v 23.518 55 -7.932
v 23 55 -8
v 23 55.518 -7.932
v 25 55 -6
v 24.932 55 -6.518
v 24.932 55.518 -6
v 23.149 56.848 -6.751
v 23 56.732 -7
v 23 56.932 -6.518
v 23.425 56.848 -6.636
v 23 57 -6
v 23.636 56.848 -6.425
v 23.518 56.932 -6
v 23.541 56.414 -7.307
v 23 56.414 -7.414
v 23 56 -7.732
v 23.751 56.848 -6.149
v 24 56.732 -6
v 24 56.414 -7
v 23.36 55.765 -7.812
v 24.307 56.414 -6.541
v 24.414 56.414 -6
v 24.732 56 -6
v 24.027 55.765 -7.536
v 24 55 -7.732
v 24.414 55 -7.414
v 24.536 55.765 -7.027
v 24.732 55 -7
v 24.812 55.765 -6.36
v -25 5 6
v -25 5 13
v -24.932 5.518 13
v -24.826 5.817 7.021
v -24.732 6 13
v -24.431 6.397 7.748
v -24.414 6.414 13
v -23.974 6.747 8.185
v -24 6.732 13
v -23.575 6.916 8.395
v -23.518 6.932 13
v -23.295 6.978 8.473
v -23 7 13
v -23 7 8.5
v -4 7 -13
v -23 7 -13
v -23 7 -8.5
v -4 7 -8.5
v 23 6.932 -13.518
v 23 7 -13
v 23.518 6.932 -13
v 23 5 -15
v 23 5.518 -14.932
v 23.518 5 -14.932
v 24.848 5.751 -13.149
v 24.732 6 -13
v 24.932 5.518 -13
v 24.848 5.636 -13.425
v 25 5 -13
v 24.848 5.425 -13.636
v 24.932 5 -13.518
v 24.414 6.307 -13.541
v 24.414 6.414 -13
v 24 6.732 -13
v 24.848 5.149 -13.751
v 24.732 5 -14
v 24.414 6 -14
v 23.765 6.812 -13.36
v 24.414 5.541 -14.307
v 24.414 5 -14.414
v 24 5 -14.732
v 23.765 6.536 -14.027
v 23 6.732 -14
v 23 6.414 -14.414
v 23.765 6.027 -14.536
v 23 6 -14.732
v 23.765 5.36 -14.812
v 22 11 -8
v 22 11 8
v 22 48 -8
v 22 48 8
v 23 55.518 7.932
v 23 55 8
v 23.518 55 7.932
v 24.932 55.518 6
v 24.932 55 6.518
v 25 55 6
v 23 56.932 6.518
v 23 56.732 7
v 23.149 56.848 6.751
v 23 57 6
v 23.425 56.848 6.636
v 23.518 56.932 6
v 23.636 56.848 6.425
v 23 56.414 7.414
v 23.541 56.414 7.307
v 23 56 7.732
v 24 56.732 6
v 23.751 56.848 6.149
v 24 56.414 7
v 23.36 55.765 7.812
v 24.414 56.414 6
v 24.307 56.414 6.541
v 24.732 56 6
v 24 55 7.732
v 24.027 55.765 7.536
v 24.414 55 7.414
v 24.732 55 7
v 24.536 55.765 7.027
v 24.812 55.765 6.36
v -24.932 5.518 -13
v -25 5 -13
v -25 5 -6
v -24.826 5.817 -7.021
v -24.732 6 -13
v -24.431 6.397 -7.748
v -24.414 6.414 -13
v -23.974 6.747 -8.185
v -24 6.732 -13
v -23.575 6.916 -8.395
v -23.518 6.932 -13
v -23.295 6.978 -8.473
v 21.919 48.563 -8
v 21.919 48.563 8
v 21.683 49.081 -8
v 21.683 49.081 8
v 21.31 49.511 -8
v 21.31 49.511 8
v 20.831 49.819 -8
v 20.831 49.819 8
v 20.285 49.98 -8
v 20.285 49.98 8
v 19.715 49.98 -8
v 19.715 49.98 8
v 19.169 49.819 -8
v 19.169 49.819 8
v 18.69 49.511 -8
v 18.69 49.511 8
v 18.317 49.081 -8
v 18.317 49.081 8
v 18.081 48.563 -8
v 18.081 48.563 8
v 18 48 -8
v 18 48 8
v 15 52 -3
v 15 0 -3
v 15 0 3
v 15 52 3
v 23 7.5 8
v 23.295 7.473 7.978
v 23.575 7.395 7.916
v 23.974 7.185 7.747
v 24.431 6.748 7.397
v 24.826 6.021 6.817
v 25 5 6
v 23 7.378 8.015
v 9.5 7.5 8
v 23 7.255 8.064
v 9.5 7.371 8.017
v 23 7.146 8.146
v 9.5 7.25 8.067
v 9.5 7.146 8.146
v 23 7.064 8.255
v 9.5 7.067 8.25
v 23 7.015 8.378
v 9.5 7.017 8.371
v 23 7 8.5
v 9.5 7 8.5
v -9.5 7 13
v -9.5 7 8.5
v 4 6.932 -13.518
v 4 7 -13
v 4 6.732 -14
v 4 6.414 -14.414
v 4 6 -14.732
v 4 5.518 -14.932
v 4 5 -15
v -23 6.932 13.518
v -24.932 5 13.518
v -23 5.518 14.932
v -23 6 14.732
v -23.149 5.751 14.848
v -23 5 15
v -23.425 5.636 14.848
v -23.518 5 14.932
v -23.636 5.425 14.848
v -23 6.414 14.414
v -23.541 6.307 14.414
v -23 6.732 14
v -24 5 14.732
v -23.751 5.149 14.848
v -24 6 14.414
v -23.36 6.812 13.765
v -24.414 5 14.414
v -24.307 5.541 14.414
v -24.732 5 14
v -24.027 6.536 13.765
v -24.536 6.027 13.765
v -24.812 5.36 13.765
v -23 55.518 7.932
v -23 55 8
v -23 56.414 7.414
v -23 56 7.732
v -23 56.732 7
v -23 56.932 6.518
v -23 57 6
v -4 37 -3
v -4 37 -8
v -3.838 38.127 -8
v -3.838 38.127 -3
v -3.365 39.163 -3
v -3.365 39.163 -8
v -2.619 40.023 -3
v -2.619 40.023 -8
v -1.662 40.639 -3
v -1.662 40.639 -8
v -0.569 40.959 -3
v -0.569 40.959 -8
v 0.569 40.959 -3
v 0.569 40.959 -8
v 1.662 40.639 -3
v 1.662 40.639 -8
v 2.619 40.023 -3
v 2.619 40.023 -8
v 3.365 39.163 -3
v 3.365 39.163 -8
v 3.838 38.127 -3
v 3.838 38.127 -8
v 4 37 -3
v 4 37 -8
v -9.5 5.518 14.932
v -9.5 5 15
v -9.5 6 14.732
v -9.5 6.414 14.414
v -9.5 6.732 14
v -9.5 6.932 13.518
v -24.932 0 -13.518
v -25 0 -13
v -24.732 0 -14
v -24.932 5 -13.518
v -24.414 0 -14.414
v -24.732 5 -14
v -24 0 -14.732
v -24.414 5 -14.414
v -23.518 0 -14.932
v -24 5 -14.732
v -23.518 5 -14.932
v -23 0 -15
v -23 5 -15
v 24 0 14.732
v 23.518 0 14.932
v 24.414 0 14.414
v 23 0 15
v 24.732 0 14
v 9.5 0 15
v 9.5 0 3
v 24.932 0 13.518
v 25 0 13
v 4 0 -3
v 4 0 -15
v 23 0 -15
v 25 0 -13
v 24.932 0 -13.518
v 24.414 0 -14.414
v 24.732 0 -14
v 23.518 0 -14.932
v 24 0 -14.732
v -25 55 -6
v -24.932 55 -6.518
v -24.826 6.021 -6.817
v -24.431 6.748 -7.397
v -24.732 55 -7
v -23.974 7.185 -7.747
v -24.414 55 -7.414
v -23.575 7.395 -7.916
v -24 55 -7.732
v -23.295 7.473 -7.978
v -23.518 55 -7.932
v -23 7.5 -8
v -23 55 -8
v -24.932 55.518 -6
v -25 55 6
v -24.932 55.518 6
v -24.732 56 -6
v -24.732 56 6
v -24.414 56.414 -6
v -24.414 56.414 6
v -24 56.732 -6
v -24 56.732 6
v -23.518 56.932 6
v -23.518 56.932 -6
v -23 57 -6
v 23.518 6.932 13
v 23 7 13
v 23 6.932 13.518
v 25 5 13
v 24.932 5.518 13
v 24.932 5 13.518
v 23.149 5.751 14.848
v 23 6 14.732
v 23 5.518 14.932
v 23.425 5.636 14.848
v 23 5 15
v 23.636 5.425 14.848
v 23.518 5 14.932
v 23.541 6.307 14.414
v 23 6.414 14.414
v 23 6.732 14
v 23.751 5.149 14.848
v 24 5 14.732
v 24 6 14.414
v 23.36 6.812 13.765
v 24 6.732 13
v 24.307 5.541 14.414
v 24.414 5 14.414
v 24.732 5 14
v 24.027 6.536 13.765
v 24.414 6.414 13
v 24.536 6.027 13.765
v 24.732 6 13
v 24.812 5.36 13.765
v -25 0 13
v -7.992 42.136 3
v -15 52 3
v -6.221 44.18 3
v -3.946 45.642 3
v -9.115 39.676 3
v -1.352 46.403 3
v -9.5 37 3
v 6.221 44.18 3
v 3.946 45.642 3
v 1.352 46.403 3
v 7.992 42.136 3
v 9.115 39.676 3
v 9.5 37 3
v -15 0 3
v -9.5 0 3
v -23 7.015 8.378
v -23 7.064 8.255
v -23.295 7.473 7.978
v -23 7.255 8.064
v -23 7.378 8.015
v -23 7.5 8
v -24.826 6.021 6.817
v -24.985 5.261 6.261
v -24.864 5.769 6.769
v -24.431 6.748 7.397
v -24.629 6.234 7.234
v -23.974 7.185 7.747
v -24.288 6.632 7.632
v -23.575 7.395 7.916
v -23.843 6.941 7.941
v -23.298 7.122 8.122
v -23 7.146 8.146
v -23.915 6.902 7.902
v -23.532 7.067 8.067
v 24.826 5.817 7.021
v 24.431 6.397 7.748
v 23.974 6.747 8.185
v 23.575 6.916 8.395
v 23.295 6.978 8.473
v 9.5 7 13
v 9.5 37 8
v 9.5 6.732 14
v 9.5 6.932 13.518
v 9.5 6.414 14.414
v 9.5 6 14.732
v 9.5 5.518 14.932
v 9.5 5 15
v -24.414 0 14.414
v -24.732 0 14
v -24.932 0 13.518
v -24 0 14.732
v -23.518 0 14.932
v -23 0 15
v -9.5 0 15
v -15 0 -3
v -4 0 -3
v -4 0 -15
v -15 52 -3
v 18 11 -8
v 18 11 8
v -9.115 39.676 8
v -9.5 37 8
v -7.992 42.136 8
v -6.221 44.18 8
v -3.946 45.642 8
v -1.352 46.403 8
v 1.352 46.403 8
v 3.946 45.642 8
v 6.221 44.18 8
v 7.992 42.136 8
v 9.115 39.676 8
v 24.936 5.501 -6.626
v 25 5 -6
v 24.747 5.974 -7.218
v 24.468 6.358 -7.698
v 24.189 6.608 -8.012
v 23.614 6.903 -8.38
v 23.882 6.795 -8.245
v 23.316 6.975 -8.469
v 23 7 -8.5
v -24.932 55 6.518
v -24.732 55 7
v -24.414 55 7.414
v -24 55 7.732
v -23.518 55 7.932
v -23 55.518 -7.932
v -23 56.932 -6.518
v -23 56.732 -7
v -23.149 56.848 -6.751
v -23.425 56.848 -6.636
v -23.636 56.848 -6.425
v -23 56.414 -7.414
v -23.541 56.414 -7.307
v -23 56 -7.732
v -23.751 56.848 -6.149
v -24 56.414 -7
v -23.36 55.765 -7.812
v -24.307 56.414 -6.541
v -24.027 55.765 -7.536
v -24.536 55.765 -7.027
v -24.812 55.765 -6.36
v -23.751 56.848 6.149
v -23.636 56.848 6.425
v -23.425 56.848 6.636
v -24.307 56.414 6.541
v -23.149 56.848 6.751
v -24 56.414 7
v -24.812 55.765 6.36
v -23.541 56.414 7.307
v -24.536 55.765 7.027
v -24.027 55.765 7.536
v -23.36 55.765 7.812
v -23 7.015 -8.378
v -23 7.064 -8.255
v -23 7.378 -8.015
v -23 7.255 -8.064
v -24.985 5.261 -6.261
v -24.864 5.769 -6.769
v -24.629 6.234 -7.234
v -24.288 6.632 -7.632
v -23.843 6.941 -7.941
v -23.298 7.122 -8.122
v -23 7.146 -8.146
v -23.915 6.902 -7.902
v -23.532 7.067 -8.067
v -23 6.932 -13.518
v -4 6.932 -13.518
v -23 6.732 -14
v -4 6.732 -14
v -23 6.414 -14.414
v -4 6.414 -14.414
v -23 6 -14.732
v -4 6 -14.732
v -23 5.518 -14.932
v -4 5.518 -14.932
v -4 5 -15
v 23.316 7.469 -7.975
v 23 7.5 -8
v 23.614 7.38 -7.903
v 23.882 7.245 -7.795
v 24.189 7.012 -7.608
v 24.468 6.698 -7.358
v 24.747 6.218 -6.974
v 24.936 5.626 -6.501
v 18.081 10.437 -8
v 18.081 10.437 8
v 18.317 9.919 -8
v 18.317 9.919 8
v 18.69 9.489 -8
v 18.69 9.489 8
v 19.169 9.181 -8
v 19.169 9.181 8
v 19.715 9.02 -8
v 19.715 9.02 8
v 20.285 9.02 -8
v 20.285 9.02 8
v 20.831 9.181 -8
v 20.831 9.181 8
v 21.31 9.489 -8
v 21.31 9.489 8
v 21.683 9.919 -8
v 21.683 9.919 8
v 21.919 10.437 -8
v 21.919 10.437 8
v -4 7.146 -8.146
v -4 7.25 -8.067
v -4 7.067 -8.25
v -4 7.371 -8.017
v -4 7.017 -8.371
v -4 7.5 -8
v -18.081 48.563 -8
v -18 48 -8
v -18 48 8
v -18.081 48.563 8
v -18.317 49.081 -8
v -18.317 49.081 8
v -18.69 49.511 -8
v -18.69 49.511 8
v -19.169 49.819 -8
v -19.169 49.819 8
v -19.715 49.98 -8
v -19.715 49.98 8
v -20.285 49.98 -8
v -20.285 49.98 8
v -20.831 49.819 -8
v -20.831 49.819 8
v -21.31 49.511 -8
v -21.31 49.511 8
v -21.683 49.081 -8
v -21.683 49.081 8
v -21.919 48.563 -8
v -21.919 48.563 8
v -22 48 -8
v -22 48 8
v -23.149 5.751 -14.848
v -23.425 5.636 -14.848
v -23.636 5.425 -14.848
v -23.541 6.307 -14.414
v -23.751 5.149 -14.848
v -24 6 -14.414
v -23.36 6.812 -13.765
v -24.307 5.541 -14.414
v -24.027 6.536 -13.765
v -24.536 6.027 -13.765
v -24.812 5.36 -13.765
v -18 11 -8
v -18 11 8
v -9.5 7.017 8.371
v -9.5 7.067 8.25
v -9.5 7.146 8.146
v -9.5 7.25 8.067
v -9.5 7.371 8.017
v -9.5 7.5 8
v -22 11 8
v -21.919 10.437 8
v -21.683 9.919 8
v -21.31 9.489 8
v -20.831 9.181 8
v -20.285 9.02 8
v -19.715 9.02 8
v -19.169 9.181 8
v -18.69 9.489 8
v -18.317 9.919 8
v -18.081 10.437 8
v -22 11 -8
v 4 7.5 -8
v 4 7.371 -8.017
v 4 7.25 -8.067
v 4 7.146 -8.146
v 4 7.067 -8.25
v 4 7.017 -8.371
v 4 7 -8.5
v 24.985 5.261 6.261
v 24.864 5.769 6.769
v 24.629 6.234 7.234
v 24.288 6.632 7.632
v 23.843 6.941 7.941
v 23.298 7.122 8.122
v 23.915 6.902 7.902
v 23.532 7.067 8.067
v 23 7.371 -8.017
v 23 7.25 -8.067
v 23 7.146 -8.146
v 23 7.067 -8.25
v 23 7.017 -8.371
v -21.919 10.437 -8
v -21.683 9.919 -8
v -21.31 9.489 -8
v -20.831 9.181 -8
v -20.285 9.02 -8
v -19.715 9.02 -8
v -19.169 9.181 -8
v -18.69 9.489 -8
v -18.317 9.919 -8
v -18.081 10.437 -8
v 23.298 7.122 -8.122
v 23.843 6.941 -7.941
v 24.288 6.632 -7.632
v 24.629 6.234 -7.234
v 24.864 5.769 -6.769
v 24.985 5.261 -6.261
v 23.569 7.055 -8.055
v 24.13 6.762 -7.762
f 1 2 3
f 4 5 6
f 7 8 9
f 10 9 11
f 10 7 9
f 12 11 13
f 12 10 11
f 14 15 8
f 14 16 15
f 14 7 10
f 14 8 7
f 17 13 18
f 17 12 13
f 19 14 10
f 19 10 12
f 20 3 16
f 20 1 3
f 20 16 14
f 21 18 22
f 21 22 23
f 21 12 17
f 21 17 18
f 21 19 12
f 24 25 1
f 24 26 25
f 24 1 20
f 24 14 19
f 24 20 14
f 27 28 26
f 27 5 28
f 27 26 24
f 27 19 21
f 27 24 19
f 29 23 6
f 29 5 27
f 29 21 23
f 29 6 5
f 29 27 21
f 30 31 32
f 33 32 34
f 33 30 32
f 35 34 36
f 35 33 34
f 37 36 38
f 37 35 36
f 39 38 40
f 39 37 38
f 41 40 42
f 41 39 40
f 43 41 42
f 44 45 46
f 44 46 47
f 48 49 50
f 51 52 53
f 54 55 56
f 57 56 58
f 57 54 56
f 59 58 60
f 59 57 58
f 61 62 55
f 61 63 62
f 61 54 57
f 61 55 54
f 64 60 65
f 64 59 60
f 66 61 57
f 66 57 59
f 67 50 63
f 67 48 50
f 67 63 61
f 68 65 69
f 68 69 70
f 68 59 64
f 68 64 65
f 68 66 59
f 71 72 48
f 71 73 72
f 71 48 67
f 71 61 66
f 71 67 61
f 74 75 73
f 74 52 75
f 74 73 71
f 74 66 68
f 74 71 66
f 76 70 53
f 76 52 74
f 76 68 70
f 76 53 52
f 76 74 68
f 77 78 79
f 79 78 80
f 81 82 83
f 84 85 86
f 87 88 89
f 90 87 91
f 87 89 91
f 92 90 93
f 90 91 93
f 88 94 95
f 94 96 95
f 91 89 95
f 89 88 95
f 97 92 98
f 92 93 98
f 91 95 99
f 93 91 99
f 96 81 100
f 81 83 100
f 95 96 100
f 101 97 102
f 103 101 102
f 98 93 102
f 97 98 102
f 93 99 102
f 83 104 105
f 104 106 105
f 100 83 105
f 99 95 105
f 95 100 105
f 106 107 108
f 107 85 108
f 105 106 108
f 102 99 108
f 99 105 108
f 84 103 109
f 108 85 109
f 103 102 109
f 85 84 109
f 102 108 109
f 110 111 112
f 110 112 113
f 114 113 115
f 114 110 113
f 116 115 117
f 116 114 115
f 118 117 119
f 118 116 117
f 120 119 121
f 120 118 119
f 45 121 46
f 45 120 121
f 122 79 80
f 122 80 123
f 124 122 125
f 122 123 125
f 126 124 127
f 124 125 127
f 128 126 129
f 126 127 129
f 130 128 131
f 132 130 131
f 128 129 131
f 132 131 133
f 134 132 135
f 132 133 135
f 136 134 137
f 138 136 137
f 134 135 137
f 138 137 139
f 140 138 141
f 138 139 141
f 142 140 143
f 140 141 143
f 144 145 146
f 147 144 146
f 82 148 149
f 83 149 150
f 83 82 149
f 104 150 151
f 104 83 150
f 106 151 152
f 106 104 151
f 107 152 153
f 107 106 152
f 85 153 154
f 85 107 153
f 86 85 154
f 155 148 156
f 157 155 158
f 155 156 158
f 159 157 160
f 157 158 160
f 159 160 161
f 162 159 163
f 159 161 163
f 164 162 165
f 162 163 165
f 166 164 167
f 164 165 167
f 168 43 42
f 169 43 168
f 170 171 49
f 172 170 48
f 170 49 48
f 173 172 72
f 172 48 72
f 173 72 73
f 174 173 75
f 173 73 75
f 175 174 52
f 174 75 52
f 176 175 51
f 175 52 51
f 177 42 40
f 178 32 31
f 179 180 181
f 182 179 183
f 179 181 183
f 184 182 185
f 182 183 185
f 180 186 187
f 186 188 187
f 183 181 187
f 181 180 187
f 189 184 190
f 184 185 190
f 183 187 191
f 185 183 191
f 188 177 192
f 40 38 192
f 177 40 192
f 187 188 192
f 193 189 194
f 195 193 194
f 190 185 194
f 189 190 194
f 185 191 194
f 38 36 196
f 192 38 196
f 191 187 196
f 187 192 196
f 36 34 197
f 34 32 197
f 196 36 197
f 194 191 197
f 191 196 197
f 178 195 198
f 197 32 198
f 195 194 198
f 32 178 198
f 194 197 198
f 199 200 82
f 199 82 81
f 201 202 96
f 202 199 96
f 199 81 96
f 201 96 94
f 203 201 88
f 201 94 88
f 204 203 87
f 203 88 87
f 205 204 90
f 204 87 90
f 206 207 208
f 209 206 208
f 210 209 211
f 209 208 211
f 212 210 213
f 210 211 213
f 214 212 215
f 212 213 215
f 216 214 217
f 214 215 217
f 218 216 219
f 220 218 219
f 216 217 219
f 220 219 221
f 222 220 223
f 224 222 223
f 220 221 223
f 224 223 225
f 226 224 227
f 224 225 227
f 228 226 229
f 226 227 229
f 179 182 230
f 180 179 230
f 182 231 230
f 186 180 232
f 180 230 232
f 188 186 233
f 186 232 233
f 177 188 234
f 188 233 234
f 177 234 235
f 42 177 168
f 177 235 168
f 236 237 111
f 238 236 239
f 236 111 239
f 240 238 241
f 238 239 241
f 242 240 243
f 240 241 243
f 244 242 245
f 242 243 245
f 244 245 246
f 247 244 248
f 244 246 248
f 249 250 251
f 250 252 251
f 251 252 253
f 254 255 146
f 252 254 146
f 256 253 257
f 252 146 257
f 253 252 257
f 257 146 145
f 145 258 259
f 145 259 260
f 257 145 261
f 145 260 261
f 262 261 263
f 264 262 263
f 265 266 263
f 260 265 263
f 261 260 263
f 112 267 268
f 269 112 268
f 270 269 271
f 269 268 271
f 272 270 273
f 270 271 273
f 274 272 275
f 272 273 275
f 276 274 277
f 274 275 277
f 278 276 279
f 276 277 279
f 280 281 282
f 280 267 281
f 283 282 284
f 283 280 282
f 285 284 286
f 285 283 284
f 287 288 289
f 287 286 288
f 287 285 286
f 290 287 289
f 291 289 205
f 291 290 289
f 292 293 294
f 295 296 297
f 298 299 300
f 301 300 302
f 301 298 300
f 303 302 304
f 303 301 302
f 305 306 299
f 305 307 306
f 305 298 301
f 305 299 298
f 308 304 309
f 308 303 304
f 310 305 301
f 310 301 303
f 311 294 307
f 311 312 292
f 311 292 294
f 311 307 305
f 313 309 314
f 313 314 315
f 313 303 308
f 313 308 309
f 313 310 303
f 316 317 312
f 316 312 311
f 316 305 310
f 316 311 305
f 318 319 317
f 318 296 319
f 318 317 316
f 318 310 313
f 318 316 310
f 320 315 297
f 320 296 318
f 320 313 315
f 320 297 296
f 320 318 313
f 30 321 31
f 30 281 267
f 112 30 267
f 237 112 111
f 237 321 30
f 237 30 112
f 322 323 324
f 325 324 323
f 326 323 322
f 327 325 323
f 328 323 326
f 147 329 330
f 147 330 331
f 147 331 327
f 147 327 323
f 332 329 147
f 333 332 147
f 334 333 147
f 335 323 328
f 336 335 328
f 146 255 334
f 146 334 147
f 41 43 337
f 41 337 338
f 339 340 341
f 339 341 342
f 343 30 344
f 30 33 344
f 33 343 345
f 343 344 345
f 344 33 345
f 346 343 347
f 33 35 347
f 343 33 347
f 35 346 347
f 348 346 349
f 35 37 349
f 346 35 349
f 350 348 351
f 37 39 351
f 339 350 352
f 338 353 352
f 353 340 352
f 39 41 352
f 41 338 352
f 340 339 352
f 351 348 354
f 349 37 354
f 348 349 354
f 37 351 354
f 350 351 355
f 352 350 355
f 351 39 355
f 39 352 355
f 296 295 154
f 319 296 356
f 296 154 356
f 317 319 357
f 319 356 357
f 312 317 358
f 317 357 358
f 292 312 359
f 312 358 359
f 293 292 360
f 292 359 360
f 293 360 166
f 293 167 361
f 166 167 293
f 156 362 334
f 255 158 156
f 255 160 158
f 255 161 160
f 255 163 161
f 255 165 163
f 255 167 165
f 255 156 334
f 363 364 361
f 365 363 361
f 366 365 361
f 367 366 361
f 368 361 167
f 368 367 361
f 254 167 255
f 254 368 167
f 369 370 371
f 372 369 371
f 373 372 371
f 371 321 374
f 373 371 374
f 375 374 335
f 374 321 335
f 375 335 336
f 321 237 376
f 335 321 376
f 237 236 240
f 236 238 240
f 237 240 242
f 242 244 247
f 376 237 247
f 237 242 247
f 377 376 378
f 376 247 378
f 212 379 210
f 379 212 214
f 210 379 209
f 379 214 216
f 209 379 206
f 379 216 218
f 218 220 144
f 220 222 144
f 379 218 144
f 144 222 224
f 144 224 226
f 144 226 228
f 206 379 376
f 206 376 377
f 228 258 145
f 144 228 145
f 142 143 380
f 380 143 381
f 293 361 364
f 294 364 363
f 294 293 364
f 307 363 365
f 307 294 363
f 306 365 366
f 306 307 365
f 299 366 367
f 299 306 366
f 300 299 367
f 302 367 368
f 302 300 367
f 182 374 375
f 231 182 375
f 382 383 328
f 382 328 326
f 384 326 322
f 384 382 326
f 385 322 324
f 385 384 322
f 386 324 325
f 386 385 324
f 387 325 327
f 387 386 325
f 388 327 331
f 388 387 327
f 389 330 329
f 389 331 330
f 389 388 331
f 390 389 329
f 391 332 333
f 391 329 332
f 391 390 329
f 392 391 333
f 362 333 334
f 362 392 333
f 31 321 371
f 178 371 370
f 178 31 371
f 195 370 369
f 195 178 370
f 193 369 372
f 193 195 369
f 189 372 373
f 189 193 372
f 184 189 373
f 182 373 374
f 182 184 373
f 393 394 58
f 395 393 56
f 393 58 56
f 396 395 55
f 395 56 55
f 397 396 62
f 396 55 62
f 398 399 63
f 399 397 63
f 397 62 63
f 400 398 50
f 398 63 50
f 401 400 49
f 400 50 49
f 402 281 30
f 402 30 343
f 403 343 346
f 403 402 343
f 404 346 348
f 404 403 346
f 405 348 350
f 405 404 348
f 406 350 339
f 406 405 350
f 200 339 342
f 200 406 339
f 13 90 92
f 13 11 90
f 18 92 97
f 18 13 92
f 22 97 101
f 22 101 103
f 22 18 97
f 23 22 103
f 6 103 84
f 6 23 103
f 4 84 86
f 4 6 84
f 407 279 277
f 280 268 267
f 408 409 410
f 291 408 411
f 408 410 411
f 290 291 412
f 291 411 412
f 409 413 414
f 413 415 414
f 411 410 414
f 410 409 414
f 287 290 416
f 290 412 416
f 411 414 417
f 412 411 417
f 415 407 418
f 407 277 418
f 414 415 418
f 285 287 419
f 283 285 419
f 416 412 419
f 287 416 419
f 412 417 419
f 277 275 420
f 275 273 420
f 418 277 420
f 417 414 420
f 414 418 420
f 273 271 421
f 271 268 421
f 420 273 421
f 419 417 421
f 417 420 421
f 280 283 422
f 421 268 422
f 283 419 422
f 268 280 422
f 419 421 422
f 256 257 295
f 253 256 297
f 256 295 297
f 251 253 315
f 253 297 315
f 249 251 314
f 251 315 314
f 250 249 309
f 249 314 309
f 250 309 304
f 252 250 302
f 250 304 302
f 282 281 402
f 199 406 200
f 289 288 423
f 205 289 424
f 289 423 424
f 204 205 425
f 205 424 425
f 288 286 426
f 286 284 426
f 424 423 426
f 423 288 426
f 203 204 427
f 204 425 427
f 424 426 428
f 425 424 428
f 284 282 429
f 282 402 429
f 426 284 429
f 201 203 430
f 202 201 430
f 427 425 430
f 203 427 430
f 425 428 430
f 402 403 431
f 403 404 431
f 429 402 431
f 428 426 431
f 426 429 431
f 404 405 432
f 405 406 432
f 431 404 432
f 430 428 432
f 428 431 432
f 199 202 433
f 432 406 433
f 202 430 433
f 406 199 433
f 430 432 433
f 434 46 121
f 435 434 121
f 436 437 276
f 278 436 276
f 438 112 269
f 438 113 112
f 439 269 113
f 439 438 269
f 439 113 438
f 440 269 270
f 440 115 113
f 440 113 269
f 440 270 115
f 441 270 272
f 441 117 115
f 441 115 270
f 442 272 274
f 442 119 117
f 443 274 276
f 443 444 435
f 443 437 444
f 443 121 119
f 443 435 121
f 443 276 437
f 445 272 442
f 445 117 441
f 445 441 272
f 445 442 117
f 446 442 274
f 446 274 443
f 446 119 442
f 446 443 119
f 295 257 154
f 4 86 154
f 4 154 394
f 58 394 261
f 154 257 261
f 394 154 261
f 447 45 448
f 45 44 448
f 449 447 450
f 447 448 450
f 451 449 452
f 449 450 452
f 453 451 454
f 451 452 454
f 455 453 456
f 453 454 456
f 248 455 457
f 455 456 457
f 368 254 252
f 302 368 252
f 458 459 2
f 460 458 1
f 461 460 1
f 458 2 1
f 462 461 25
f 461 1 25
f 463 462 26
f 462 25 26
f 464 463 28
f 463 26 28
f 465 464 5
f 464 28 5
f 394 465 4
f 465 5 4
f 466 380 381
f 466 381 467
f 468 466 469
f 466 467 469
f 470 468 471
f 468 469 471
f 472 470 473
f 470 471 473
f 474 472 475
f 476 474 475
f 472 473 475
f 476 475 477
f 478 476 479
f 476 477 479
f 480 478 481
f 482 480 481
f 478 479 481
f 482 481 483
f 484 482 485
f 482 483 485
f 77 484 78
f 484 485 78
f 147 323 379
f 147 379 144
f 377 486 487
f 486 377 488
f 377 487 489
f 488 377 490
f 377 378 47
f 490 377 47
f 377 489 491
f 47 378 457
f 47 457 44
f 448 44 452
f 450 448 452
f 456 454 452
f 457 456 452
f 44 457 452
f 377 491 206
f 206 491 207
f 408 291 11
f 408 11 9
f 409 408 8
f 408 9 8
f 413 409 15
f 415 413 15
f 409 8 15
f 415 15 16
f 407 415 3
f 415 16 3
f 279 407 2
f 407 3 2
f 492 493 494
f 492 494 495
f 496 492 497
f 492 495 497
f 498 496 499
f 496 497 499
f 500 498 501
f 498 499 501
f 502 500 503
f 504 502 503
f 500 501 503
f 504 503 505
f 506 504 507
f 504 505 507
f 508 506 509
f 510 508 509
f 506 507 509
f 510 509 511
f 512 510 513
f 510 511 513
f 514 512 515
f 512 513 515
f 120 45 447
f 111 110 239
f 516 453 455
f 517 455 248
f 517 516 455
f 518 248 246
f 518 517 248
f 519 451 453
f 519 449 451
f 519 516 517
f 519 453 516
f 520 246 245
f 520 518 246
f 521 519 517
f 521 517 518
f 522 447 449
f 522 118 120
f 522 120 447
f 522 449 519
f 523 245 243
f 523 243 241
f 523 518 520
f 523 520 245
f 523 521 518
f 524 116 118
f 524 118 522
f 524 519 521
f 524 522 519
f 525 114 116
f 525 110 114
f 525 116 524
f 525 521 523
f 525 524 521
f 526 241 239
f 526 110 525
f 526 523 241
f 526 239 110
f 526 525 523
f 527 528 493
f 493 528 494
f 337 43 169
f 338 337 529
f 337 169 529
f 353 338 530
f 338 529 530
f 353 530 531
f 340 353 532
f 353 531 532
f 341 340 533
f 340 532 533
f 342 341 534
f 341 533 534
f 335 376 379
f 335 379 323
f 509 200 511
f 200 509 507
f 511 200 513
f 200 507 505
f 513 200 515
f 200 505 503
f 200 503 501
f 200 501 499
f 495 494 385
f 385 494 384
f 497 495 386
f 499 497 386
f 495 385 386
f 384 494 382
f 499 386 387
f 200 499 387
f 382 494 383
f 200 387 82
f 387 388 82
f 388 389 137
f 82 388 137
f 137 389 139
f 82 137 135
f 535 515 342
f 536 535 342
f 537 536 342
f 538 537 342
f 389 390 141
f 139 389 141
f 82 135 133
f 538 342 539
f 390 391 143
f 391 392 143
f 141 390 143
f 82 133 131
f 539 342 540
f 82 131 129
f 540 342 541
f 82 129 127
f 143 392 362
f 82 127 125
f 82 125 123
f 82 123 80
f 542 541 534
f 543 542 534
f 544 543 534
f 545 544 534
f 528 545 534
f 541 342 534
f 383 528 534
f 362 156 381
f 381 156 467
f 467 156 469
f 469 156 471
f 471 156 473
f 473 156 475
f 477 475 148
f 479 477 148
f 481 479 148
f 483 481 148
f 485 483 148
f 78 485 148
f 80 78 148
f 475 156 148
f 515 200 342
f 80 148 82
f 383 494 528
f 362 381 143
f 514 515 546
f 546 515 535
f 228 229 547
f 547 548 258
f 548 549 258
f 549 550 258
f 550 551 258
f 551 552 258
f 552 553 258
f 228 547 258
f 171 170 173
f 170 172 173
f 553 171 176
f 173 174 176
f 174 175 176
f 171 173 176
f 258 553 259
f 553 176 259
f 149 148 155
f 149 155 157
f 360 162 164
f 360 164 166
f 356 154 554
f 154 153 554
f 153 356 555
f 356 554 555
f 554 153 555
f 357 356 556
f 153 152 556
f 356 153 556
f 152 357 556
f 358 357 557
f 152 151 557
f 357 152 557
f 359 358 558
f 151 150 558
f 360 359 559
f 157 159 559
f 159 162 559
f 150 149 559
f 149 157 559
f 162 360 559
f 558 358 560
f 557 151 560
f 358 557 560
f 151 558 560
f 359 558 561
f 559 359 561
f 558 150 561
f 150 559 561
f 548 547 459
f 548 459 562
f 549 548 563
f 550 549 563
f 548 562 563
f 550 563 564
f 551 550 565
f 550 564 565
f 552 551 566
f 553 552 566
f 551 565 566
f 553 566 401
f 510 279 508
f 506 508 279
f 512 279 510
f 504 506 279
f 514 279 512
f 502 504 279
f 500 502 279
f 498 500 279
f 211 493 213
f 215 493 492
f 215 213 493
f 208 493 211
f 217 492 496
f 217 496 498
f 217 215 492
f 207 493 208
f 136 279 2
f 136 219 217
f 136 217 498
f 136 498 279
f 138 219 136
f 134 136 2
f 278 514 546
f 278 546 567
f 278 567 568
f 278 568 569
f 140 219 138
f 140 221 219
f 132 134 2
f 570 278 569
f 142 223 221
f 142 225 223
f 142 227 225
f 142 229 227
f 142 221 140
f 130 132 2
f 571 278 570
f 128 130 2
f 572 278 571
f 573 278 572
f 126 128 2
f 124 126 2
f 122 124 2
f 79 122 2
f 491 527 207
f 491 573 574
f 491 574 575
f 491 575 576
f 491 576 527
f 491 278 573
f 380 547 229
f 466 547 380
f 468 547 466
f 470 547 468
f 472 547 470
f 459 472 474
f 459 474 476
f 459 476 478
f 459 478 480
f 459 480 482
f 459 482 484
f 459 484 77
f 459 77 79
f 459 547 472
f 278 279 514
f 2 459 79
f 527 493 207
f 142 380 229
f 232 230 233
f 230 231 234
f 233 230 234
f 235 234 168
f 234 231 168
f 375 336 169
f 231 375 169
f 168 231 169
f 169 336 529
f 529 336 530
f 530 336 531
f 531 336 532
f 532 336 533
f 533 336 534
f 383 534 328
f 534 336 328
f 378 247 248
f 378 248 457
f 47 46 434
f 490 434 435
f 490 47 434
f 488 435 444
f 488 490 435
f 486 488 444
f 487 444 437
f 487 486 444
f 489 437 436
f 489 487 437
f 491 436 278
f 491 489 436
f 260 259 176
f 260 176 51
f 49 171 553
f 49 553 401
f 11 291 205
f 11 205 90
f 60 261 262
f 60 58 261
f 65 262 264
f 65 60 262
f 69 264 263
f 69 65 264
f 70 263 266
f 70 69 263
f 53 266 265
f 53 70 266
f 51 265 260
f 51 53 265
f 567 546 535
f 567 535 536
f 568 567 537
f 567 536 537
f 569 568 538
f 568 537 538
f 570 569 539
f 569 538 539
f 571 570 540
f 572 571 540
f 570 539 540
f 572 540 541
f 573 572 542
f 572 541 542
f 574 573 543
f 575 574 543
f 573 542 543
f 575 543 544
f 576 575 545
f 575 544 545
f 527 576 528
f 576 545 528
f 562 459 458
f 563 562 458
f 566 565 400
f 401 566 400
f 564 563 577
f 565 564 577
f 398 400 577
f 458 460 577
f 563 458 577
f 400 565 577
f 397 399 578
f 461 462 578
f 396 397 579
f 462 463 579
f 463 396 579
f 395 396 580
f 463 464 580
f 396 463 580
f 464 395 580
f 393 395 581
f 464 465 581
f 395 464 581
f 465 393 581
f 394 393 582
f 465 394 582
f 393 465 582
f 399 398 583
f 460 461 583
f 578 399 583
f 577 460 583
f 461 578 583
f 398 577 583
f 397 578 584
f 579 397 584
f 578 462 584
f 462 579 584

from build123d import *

# Parameters (mm, degrees)
SKETCH2_W                      = 50
SKETCH2_H                      = 30
BOSS_EXTRUDE1_DEPTH            = 7
SKETCH3_W                      = 50
SKETCH3_H                      = 16
BOSS_EXTRUDE2_DEPTH            = 50
SKETCH5_W                      = 30
SKETCH5_H                      = 6
CUT_EXTRUDE1_DEPTH             = 52
CUT_EXTRUDE3_REACH             = 68.355
CUT_EXTRUDE3_DIRECTION_2_REACH = 68.355
CUT_EXTRUDE4_REACH             = 68.355
CUT_EXTRUDE4_DIRECTION_2_REACH = 68.355
CUT_EXTRUDE5_REACH             = 68.355
FILLET1_R                      = 2
FILLET2_R                      = 0.5


with BuildPart() as part:
    # Sketch2 → Boss-Extrude1 (new body)
    with BuildSketch(Plane(origin=(0, 0, 0), x_dir=(1, 0, 0), z_dir=(0, 1, 0))):
        Rectangle(SKETCH2_W, SKETCH2_H)
    extrude(amount=BOSS_EXTRUDE1_DEPTH)

    # Sketch3 → Boss-Extrude2 (add)
    with BuildSketch(Plane(origin=(0, 7, 0), x_dir=(1, 0, 0), z_dir=(0, 1, 0))):
        Rectangle(SKETCH3_W, SKETCH3_H)
    extrude(amount=BOSS_EXTRUDE2_DEPTH)

    # Sketch5 → Cut-Extrude1 (cut)
    with BuildSketch(Plane.XZ):
        Rectangle(SKETCH5_W, SKETCH5_H)
    extrude(amount=-CUT_EXTRUDE1_DEPTH, mode=Mode.SUBTRACT)

    # Sketch4 → Cut-Extrude3 (cut, up to next)
    with BuildSketch(Plane.XY.offset(8), mode=Mode.PRIVATE) as cut_extrude3_sk1:
        with BuildLine():
            Line((-9.5, 15), (-9.5, 37))
            ThreePointArc((-9.5, 37), (0, 46.5), (9.5, 37))
            Line((9.5, 37), (9.5, 15))
            Line((9.5, 15), (9.5, 0))
            Line((9.5, 0), (-9.5, 0))
            Line((-9.5, 0), (-9.5, 15))
        make_face()
    cut_extrude3_tool1 = extrude(cut_extrude3_sk1.sketch, amount=-CUT_EXTRUDE3_REACH, mode=Mode.PRIVATE) & part.part
    add(cut_extrude3_tool1.solids().sort_by_distance((0, 22.281201, 8))[0], mode=Mode.SUBTRACT)

    # Sketch4 → Cut-Extrude3 direction 2 (cut, up to next)
    with BuildSketch(Plane.XY.offset(8), mode=Mode.PRIVATE) as cut_extrude3_direction_2_sk1:
        with BuildLine():
            Line((-9.5, 15), (-9.5, 37))
            ThreePointArc((-9.5, 37), (0, 46.5), (9.5, 37))
            Line((9.5, 37), (9.5, 15))
            Line((9.5, 15), (9.5, 0))
            Line((9.5, 0), (-9.5, 0))
            Line((-9.5, 0), (-9.5, 15))
        make_face()
    cut_extrude3_direction_2_tool1 = extrude(cut_extrude3_direction_2_sk1.sketch, amount=CUT_EXTRUDE3_DIRECTION_2_REACH, mode=Mode.PRIVATE) & part.part
    add(cut_extrude3_direction_2_tool1.solids().sort_by_distance((0, 22.281201, 8))[0], mode=Mode.SUBTRACT)

    # Sketch6 → Cut-Extrude4 (cut, up to next)
    with BuildSketch(Plane(origin=(0, 0, -8), x_dir=(-1, 0, 0), z_dir=(0, 0, -1)), mode=Mode.PRIVATE) as cut_extrude4_sk1:
        with BuildLine():
            Line((-4, 37), (-4, 0))
            Line((-4, 0), (4, 0))
            Line((4, 0), (4, 37))
            ThreePointArc((4, 37), (0, 41), (-4, 37))
        make_face()
    cut_extrude4_tool1 = extrude(cut_extrude4_sk1.sketch, amount=-CUT_EXTRUDE4_REACH, mode=Mode.PRIVATE) & part.part
    add(cut_extrude4_tool1.solids().sort_by_distance((0, 20.080724, -8))[0], mode=Mode.SUBTRACT)

    # Sketch6 → Cut-Extrude4 direction 2 (cut, up to next)
    with BuildSketch(Plane(origin=(0, 0, -8), x_dir=(-1, 0, 0), z_dir=(0, 0, -1)), mode=Mode.PRIVATE) as cut_extrude4_direction_2_sk1:
        with BuildLine():
            Line((-4, 37), (-4, 0))
            Line((-4, 0), (4, 0))
            Line((4, 0), (4, 37))
            ThreePointArc((4, 37), (0, 41), (-4, 37))
        make_face()
    cut_extrude4_direction_2_tool1 = extrude(cut_extrude4_direction_2_sk1.sketch, amount=CUT_EXTRUDE4_DIRECTION_2_REACH, mode=Mode.PRIVATE) & part.part
    add(cut_extrude4_direction_2_tool1.solids().sort_by_distance((0, 20.080724, -8))[0], mode=Mode.SUBTRACT)

    # Sketch8 → Cut-Extrude5 (cut, up to next)
    with BuildSketch(Plane.XY.offset(8), mode=Mode.PRIVATE) as cut_extrude5_sk1:
        with BuildLine():
            Line((-22, 48), (-22, 11))
            ThreePointArc((-22, 11), (-20, 9), (-18, 11))
            Line((-18, 11), (-18, 48))
            ThreePointArc((-18, 48), (-20, 50), (-22, 48))
        make_face()
    cut_extrude5_tool1 = extrude(cut_extrude5_sk1.sketch, amount=-CUT_EXTRUDE5_REACH, mode=Mode.PRIVATE) & part.part
    # Sketch8 → Cut-Extrude5 (cut, up to next)
    with BuildSketch(Plane.XY.offset(8), mode=Mode.PRIVATE) as cut_extrude5_sk2:
        with BuildLine():
            Line((18, 48), (18, 11))
            ThreePointArc((18, 11), (20, 9), (22, 11))
            Line((22, 11), (22, 48))
            ThreePointArc((22, 48), (20, 50), (18, 48))
        make_face()
    cut_extrude5_tool2 = extrude(cut_extrude5_sk2.sketch, amount=-CUT_EXTRUDE5_REACH, mode=Mode.PRIVATE) & part.part
    add(cut_extrude5_tool1.solids().sort_by_distance((-20, 29.5, 8))[0], mode=Mode.SUBTRACT)
    add(cut_extrude5_tool2.solids().sort_by_distance((20, 29.5, 8))[0], mode=Mode.SUBTRACT)

    # Fillet1
    fillet1_edges = [part.edges().sort_by_distance(p)[0] for p in [
        (25, 7, 11.5),
        (14.5, 7, -15),
        (-25, 7, 11.5),
        (25, 7, -11.5),
        (25, 32, -8),
        (-25, 32, -8),
        (-25, 32, 8),
        (25, 32, 8),
        (0, 57, -8),
        (-25, 57, 0),
        (0, 57, 8),
        (25, 57, 0),
        (-25, 7, -11.5),
        (17.25, 7, 15),
        (-14.5, 7, -15),
        (-17.25, 7, 15),
        (-25, 3.5, -15),
        (25, 3.5, -15),
        (25, 3.5, 15),
        (-25, 3.5, 15),
    ]]
    fillet(fillet1_edges, radius=FILLET1_R)

    # Fillet2
    fillet2_edges = [part.edges().sort_by_distance(p)[0] for p in [
        (-16.25, 7, 8),
        (13.5, 7, -8),
        (-24.526592034, 6.292097815, 7.292097815),
        (-24.526592034, 6.292097815, -7.292097815),
        (24.526592034, 6.292097815, 7.292097815),
        (24.526592034, 6.292097815, -7.292097815),
        (16.25, 7, 8),
        (-13.5, 7, -8),
    ]]
    fillet(fillet2_edges, radius=FILLET2_R)


solid = part.part
